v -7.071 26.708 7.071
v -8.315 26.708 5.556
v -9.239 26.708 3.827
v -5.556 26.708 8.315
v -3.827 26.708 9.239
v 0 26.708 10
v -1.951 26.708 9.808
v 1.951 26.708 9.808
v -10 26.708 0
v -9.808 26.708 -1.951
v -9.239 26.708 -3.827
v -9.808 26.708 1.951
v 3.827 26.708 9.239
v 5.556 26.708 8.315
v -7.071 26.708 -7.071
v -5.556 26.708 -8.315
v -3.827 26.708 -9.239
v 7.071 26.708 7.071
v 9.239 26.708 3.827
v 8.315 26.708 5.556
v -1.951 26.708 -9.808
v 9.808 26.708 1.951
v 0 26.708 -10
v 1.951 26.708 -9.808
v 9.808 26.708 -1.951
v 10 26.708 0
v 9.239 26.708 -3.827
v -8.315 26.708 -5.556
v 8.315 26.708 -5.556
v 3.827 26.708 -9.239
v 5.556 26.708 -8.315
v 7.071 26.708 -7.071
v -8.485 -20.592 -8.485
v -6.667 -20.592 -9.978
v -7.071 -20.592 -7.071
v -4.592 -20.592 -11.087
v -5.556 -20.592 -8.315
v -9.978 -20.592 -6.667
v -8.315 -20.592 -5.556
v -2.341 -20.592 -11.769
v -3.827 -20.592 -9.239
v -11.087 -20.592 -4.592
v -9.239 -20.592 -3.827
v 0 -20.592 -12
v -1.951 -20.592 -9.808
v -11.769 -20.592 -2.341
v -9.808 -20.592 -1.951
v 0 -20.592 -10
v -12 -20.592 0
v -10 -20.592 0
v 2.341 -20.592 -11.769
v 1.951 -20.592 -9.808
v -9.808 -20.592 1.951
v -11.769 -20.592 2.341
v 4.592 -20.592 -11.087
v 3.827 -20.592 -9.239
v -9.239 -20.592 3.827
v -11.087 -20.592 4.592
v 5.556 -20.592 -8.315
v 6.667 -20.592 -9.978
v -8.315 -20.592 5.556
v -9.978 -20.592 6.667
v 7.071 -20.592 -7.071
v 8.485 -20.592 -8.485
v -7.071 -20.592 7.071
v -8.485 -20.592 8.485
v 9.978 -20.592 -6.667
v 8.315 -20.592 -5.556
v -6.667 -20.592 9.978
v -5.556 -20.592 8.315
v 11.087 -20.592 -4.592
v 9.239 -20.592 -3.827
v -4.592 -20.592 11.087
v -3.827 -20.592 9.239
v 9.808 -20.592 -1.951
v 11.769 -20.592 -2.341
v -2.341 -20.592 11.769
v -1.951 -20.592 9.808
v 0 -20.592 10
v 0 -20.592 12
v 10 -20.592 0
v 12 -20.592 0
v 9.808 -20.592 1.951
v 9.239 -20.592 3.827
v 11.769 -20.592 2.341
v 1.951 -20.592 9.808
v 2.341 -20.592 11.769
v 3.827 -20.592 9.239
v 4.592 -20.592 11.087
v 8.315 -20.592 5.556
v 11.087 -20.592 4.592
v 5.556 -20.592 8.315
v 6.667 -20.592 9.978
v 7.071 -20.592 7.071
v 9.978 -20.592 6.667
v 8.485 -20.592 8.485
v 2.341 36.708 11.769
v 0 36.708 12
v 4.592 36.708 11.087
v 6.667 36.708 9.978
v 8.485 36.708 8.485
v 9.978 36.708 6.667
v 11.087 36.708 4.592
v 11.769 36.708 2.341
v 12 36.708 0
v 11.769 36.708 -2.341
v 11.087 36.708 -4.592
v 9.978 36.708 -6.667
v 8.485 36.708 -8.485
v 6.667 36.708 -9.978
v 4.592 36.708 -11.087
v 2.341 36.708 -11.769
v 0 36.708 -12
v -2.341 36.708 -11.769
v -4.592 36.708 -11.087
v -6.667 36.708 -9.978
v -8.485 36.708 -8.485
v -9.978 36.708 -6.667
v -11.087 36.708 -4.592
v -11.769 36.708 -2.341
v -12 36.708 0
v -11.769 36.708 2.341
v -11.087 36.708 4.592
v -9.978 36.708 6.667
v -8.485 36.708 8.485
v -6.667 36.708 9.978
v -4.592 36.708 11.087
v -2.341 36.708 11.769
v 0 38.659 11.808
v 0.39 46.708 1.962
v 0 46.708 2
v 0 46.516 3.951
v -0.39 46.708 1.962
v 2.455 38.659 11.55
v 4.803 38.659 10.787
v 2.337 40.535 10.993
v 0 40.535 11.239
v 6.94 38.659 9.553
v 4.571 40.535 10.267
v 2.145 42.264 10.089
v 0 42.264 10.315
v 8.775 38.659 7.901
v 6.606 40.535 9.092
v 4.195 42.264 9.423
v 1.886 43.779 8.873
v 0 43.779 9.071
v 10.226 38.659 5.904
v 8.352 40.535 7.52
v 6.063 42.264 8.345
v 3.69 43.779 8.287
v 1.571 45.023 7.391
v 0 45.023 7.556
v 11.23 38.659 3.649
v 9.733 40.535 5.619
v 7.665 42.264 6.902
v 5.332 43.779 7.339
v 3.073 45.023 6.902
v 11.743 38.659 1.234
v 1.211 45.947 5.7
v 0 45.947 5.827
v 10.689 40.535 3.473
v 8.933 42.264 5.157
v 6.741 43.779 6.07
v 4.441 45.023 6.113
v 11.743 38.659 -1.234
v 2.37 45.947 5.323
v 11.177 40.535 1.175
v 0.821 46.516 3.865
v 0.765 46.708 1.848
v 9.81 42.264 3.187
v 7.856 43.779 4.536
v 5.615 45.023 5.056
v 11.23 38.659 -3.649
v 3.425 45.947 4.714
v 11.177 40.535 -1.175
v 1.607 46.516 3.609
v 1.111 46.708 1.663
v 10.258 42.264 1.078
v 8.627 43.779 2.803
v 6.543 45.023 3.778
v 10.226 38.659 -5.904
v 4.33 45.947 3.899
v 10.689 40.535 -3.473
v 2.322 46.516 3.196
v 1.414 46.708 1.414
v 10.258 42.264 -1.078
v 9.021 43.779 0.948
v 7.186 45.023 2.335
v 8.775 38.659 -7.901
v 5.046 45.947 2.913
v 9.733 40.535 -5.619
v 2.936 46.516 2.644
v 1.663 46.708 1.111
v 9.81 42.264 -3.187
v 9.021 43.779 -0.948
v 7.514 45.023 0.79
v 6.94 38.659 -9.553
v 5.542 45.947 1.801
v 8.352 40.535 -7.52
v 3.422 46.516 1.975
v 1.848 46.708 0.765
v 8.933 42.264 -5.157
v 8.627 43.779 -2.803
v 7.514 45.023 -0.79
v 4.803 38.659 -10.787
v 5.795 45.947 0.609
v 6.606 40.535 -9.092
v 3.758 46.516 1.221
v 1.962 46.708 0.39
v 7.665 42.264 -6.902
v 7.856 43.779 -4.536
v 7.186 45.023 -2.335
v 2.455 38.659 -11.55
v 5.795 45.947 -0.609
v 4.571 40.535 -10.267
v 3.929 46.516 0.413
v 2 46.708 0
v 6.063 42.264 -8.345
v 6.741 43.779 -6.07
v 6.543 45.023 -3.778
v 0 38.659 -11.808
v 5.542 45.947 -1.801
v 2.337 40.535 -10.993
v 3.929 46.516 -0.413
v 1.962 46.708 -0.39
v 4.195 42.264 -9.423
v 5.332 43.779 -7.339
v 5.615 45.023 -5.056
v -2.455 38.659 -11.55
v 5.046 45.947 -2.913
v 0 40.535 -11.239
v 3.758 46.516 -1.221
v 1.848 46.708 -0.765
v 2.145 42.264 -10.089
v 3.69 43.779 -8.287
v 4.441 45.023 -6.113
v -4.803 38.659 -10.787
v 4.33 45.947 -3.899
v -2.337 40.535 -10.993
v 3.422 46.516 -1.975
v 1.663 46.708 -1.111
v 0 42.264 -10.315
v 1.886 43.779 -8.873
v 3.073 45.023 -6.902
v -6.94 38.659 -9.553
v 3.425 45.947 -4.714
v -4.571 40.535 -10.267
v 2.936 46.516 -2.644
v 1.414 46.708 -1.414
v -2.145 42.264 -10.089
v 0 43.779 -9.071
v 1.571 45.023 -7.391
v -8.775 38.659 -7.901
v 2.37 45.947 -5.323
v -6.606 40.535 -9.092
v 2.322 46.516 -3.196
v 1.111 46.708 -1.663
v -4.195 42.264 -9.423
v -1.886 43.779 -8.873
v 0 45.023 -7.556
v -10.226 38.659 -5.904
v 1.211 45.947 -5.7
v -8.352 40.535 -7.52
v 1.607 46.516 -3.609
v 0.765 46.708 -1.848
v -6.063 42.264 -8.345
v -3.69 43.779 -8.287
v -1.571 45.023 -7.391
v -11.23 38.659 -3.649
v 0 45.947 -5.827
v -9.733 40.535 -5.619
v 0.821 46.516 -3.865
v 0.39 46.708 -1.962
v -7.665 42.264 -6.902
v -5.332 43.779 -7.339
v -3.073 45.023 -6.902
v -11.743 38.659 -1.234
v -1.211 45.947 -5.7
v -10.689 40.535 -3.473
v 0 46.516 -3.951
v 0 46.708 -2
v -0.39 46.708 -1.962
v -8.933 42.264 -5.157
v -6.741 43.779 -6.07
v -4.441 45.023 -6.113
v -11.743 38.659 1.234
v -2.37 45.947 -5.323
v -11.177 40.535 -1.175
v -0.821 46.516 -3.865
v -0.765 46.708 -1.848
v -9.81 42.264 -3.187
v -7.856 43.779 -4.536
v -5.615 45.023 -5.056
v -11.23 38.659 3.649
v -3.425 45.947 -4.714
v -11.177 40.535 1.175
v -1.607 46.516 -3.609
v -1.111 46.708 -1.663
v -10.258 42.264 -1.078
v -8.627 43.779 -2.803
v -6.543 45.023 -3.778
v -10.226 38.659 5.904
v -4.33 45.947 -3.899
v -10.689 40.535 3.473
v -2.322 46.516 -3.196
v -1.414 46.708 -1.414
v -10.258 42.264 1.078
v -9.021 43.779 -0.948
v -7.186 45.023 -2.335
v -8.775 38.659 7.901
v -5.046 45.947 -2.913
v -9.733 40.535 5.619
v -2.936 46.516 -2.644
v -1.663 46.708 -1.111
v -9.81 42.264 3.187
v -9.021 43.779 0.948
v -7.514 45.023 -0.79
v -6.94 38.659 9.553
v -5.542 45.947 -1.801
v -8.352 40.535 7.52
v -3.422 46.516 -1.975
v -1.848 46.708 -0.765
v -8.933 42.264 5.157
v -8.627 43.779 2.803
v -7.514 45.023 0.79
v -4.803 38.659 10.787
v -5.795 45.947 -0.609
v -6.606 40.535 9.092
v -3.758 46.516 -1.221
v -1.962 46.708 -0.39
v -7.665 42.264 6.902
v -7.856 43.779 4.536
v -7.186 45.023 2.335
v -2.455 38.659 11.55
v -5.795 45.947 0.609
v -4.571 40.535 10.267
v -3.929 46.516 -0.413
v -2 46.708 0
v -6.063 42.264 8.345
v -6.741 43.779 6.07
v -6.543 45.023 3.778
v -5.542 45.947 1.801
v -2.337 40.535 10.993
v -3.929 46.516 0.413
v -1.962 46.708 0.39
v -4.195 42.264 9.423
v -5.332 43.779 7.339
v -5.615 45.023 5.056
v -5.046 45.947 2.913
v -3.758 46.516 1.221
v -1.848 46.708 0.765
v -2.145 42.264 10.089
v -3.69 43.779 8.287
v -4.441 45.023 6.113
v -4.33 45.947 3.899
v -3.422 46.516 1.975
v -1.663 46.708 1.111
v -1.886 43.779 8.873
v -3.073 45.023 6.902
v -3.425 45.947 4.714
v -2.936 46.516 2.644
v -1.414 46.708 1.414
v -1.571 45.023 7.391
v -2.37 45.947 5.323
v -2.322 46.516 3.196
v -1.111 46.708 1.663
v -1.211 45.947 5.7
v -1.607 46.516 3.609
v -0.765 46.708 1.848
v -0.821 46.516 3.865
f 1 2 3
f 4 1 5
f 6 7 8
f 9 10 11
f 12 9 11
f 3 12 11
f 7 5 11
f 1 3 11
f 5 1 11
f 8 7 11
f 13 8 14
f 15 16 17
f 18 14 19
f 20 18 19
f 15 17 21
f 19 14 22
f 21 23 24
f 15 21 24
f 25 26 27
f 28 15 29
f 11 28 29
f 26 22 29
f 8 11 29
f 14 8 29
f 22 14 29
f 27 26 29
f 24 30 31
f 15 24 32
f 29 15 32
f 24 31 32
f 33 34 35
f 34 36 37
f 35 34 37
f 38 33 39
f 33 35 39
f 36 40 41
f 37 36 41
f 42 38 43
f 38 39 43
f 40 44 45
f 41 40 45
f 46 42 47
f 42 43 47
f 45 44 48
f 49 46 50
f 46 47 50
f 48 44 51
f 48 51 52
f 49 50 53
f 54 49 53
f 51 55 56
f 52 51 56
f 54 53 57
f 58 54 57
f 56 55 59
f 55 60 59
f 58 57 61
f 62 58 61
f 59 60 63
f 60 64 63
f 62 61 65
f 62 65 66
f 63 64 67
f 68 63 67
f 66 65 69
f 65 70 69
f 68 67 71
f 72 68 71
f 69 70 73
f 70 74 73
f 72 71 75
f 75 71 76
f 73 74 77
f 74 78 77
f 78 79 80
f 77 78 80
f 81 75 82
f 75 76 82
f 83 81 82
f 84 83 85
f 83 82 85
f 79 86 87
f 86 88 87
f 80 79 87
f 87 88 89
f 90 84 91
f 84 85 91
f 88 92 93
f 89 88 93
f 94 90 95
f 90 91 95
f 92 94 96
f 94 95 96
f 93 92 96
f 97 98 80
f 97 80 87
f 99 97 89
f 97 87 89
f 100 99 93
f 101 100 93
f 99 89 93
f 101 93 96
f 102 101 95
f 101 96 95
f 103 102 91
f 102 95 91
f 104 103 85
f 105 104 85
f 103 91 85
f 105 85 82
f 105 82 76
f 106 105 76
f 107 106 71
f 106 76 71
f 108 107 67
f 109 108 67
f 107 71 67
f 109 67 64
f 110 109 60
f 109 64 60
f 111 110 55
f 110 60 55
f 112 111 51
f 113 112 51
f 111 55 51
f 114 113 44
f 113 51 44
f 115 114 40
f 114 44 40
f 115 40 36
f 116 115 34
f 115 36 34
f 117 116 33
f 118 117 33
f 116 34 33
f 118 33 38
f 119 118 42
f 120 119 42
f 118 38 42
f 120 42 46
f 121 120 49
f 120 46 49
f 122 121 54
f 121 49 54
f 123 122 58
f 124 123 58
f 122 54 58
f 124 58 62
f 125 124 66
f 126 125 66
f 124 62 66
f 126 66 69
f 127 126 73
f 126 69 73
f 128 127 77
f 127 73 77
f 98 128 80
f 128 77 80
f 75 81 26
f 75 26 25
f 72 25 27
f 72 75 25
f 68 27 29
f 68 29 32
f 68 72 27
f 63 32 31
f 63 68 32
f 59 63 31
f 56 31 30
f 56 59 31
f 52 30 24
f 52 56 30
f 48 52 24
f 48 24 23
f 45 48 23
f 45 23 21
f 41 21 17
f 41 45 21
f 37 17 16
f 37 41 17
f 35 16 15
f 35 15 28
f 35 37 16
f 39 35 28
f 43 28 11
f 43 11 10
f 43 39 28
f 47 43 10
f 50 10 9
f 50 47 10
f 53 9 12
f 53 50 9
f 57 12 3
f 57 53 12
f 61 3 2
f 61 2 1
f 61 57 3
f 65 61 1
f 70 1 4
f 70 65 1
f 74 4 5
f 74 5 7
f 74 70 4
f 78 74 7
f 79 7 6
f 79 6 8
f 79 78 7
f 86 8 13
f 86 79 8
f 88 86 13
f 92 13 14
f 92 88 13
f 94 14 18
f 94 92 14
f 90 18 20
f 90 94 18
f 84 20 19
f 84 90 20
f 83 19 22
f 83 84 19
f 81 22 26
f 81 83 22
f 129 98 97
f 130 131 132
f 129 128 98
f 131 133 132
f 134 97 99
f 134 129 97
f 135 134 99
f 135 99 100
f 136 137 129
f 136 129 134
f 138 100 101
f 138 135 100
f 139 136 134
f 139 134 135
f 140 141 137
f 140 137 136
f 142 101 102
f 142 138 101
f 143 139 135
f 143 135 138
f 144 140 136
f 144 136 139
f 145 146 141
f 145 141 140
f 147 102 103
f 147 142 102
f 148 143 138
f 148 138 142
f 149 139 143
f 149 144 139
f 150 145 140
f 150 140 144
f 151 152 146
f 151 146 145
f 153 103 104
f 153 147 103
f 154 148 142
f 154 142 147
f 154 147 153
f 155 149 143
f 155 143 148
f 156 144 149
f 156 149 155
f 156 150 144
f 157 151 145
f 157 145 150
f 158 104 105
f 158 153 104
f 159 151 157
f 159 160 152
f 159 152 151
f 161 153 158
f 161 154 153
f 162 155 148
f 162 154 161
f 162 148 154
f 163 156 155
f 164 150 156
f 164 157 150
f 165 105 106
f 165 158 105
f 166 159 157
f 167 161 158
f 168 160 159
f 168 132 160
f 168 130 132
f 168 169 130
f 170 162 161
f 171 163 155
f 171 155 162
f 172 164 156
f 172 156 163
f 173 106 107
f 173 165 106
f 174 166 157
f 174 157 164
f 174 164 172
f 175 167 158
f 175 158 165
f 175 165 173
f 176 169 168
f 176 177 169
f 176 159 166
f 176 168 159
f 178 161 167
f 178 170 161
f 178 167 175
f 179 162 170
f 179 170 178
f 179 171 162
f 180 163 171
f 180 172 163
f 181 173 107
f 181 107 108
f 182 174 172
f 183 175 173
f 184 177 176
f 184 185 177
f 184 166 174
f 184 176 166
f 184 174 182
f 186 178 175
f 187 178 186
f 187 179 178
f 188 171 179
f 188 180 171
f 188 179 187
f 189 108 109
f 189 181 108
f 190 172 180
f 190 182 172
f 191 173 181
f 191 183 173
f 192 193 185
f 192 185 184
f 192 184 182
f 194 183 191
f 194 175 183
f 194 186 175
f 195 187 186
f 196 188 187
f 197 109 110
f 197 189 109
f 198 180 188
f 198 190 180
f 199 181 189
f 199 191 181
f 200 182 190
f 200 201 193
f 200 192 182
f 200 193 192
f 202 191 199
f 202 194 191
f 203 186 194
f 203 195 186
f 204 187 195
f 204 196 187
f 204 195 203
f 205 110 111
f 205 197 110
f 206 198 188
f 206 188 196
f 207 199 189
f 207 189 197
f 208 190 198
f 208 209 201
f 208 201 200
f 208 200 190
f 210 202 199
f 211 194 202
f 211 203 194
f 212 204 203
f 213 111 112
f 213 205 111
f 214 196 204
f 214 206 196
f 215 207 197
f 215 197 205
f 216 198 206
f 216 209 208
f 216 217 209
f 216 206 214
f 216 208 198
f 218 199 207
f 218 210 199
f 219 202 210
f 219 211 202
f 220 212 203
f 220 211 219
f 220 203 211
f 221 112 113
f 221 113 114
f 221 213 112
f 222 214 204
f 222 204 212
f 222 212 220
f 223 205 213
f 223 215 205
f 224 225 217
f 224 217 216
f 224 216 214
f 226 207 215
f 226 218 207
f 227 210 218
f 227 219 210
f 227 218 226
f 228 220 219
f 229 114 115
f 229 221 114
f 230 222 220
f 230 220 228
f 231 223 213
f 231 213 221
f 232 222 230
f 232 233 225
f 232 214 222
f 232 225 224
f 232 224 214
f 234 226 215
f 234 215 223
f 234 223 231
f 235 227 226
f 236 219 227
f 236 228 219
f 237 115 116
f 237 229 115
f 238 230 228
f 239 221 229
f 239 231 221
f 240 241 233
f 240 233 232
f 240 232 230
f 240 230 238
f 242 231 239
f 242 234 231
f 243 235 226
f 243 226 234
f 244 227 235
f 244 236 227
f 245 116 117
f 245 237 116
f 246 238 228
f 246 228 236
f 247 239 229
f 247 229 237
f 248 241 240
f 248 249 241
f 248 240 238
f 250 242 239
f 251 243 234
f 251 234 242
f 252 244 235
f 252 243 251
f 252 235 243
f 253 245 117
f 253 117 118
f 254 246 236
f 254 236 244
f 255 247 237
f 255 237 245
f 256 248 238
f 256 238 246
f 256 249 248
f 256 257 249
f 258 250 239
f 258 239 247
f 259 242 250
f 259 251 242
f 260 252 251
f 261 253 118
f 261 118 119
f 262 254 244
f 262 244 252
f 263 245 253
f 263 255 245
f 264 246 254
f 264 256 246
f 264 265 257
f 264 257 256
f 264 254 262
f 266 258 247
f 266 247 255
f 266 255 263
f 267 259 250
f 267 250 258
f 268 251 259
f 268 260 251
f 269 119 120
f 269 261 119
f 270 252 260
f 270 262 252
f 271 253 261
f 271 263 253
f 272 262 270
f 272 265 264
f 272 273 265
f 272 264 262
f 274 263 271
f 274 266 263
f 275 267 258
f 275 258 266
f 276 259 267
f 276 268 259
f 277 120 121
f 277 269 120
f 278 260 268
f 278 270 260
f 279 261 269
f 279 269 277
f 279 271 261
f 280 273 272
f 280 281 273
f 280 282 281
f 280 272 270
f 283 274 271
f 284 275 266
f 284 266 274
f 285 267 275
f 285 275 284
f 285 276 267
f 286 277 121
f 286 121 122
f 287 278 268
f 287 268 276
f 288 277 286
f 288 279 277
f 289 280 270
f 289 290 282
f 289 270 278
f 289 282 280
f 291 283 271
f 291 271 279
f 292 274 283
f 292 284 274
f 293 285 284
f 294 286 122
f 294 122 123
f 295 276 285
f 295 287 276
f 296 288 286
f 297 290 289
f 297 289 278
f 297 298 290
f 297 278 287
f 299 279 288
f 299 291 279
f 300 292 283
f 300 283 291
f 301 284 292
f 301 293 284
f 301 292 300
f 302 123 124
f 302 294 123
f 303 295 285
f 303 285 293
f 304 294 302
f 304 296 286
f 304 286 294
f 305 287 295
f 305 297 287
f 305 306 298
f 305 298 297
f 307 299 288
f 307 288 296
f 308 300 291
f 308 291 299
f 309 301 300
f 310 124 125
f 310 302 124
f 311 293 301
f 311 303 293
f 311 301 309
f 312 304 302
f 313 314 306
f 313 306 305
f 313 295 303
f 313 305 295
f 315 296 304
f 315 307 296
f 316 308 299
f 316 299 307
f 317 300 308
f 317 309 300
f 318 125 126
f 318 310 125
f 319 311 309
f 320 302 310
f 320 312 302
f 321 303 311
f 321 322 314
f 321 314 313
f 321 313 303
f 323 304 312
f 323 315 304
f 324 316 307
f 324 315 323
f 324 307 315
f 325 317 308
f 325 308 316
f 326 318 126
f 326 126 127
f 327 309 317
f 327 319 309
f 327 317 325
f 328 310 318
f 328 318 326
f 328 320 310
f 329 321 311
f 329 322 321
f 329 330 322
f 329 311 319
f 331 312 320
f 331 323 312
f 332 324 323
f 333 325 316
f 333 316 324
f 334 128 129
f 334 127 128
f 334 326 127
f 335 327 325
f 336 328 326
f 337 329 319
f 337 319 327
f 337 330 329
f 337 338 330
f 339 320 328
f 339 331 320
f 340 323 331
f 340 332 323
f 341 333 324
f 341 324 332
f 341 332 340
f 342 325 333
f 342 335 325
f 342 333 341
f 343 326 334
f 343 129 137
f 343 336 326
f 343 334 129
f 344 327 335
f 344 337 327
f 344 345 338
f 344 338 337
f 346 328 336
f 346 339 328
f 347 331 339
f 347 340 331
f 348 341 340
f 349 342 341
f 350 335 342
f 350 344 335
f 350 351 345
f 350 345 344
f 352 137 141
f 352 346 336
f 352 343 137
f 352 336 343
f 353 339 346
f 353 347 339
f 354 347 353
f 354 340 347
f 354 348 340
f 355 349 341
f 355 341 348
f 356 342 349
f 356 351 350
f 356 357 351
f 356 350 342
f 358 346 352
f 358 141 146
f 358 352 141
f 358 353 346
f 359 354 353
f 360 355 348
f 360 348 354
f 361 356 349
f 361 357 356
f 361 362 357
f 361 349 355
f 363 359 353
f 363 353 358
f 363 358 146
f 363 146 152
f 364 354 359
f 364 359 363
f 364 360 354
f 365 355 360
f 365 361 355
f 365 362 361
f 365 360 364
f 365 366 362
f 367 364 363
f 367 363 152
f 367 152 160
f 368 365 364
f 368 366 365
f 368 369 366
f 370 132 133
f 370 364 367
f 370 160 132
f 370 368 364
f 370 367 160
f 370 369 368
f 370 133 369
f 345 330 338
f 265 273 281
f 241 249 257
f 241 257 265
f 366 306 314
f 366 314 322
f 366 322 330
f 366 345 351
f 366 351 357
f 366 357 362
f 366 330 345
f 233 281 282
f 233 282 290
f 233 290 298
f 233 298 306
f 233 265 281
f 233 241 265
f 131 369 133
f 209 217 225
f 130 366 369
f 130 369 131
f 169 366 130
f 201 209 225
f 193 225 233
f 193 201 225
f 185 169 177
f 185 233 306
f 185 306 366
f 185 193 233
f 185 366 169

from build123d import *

# Parameters (mm, degrees)
SKETCH1_R           = 6
BOSS_EXTRUDE1_DEPTH = 33.65
FILLET2_R           = 5
SHELL1_OUTLINE_R    = 5
SHELL1_DEPTH        = 23.65
SCALE1_SCALE        = 2


# Read off the part's stored shape, not the designer's step: Shell1
with BuildPart() as part:
    # Sketch1 → Boss-Extrude1 (new body)
    with BuildSketch(Plane(origin=(0, 0, 0), x_dir=(1, 0, 0), z_dir=(0, 1, 0))):
        with Locations(Location((0, 0, 0), (0, 0, 270))):
            Circle(SKETCH1_R)
    extrude(amount=BOSS_EXTRUDE1_DEPTH)

    # Fillet2
    fillet2_edges = [part.edges().sort_by_distance(p)[0] for p in [
        (0, 33.65, -6),
    ]]
    fillet(fillet2_edges, radius=FILLET2_R)

    # Shell1 outline → Shell1 (cut)
    with BuildSketch(Plane(origin=(0, 0, 0), x_dir=(1, 0, 0), z_dir=(0, 1, 0))):
        Circle(SHELL1_OUTLINE_R)
    extrude(amount=SHELL1_DEPTH, mode=Mode.SUBTRACT)


with BuildPart() as part_1:
    # Scale1: scaled about (0, 20.592026778, 0)
    add(part.part.scale(SCALE1_SCALE).moved(Location((0, -20.592026778, 0))))


solid = part_1.part
